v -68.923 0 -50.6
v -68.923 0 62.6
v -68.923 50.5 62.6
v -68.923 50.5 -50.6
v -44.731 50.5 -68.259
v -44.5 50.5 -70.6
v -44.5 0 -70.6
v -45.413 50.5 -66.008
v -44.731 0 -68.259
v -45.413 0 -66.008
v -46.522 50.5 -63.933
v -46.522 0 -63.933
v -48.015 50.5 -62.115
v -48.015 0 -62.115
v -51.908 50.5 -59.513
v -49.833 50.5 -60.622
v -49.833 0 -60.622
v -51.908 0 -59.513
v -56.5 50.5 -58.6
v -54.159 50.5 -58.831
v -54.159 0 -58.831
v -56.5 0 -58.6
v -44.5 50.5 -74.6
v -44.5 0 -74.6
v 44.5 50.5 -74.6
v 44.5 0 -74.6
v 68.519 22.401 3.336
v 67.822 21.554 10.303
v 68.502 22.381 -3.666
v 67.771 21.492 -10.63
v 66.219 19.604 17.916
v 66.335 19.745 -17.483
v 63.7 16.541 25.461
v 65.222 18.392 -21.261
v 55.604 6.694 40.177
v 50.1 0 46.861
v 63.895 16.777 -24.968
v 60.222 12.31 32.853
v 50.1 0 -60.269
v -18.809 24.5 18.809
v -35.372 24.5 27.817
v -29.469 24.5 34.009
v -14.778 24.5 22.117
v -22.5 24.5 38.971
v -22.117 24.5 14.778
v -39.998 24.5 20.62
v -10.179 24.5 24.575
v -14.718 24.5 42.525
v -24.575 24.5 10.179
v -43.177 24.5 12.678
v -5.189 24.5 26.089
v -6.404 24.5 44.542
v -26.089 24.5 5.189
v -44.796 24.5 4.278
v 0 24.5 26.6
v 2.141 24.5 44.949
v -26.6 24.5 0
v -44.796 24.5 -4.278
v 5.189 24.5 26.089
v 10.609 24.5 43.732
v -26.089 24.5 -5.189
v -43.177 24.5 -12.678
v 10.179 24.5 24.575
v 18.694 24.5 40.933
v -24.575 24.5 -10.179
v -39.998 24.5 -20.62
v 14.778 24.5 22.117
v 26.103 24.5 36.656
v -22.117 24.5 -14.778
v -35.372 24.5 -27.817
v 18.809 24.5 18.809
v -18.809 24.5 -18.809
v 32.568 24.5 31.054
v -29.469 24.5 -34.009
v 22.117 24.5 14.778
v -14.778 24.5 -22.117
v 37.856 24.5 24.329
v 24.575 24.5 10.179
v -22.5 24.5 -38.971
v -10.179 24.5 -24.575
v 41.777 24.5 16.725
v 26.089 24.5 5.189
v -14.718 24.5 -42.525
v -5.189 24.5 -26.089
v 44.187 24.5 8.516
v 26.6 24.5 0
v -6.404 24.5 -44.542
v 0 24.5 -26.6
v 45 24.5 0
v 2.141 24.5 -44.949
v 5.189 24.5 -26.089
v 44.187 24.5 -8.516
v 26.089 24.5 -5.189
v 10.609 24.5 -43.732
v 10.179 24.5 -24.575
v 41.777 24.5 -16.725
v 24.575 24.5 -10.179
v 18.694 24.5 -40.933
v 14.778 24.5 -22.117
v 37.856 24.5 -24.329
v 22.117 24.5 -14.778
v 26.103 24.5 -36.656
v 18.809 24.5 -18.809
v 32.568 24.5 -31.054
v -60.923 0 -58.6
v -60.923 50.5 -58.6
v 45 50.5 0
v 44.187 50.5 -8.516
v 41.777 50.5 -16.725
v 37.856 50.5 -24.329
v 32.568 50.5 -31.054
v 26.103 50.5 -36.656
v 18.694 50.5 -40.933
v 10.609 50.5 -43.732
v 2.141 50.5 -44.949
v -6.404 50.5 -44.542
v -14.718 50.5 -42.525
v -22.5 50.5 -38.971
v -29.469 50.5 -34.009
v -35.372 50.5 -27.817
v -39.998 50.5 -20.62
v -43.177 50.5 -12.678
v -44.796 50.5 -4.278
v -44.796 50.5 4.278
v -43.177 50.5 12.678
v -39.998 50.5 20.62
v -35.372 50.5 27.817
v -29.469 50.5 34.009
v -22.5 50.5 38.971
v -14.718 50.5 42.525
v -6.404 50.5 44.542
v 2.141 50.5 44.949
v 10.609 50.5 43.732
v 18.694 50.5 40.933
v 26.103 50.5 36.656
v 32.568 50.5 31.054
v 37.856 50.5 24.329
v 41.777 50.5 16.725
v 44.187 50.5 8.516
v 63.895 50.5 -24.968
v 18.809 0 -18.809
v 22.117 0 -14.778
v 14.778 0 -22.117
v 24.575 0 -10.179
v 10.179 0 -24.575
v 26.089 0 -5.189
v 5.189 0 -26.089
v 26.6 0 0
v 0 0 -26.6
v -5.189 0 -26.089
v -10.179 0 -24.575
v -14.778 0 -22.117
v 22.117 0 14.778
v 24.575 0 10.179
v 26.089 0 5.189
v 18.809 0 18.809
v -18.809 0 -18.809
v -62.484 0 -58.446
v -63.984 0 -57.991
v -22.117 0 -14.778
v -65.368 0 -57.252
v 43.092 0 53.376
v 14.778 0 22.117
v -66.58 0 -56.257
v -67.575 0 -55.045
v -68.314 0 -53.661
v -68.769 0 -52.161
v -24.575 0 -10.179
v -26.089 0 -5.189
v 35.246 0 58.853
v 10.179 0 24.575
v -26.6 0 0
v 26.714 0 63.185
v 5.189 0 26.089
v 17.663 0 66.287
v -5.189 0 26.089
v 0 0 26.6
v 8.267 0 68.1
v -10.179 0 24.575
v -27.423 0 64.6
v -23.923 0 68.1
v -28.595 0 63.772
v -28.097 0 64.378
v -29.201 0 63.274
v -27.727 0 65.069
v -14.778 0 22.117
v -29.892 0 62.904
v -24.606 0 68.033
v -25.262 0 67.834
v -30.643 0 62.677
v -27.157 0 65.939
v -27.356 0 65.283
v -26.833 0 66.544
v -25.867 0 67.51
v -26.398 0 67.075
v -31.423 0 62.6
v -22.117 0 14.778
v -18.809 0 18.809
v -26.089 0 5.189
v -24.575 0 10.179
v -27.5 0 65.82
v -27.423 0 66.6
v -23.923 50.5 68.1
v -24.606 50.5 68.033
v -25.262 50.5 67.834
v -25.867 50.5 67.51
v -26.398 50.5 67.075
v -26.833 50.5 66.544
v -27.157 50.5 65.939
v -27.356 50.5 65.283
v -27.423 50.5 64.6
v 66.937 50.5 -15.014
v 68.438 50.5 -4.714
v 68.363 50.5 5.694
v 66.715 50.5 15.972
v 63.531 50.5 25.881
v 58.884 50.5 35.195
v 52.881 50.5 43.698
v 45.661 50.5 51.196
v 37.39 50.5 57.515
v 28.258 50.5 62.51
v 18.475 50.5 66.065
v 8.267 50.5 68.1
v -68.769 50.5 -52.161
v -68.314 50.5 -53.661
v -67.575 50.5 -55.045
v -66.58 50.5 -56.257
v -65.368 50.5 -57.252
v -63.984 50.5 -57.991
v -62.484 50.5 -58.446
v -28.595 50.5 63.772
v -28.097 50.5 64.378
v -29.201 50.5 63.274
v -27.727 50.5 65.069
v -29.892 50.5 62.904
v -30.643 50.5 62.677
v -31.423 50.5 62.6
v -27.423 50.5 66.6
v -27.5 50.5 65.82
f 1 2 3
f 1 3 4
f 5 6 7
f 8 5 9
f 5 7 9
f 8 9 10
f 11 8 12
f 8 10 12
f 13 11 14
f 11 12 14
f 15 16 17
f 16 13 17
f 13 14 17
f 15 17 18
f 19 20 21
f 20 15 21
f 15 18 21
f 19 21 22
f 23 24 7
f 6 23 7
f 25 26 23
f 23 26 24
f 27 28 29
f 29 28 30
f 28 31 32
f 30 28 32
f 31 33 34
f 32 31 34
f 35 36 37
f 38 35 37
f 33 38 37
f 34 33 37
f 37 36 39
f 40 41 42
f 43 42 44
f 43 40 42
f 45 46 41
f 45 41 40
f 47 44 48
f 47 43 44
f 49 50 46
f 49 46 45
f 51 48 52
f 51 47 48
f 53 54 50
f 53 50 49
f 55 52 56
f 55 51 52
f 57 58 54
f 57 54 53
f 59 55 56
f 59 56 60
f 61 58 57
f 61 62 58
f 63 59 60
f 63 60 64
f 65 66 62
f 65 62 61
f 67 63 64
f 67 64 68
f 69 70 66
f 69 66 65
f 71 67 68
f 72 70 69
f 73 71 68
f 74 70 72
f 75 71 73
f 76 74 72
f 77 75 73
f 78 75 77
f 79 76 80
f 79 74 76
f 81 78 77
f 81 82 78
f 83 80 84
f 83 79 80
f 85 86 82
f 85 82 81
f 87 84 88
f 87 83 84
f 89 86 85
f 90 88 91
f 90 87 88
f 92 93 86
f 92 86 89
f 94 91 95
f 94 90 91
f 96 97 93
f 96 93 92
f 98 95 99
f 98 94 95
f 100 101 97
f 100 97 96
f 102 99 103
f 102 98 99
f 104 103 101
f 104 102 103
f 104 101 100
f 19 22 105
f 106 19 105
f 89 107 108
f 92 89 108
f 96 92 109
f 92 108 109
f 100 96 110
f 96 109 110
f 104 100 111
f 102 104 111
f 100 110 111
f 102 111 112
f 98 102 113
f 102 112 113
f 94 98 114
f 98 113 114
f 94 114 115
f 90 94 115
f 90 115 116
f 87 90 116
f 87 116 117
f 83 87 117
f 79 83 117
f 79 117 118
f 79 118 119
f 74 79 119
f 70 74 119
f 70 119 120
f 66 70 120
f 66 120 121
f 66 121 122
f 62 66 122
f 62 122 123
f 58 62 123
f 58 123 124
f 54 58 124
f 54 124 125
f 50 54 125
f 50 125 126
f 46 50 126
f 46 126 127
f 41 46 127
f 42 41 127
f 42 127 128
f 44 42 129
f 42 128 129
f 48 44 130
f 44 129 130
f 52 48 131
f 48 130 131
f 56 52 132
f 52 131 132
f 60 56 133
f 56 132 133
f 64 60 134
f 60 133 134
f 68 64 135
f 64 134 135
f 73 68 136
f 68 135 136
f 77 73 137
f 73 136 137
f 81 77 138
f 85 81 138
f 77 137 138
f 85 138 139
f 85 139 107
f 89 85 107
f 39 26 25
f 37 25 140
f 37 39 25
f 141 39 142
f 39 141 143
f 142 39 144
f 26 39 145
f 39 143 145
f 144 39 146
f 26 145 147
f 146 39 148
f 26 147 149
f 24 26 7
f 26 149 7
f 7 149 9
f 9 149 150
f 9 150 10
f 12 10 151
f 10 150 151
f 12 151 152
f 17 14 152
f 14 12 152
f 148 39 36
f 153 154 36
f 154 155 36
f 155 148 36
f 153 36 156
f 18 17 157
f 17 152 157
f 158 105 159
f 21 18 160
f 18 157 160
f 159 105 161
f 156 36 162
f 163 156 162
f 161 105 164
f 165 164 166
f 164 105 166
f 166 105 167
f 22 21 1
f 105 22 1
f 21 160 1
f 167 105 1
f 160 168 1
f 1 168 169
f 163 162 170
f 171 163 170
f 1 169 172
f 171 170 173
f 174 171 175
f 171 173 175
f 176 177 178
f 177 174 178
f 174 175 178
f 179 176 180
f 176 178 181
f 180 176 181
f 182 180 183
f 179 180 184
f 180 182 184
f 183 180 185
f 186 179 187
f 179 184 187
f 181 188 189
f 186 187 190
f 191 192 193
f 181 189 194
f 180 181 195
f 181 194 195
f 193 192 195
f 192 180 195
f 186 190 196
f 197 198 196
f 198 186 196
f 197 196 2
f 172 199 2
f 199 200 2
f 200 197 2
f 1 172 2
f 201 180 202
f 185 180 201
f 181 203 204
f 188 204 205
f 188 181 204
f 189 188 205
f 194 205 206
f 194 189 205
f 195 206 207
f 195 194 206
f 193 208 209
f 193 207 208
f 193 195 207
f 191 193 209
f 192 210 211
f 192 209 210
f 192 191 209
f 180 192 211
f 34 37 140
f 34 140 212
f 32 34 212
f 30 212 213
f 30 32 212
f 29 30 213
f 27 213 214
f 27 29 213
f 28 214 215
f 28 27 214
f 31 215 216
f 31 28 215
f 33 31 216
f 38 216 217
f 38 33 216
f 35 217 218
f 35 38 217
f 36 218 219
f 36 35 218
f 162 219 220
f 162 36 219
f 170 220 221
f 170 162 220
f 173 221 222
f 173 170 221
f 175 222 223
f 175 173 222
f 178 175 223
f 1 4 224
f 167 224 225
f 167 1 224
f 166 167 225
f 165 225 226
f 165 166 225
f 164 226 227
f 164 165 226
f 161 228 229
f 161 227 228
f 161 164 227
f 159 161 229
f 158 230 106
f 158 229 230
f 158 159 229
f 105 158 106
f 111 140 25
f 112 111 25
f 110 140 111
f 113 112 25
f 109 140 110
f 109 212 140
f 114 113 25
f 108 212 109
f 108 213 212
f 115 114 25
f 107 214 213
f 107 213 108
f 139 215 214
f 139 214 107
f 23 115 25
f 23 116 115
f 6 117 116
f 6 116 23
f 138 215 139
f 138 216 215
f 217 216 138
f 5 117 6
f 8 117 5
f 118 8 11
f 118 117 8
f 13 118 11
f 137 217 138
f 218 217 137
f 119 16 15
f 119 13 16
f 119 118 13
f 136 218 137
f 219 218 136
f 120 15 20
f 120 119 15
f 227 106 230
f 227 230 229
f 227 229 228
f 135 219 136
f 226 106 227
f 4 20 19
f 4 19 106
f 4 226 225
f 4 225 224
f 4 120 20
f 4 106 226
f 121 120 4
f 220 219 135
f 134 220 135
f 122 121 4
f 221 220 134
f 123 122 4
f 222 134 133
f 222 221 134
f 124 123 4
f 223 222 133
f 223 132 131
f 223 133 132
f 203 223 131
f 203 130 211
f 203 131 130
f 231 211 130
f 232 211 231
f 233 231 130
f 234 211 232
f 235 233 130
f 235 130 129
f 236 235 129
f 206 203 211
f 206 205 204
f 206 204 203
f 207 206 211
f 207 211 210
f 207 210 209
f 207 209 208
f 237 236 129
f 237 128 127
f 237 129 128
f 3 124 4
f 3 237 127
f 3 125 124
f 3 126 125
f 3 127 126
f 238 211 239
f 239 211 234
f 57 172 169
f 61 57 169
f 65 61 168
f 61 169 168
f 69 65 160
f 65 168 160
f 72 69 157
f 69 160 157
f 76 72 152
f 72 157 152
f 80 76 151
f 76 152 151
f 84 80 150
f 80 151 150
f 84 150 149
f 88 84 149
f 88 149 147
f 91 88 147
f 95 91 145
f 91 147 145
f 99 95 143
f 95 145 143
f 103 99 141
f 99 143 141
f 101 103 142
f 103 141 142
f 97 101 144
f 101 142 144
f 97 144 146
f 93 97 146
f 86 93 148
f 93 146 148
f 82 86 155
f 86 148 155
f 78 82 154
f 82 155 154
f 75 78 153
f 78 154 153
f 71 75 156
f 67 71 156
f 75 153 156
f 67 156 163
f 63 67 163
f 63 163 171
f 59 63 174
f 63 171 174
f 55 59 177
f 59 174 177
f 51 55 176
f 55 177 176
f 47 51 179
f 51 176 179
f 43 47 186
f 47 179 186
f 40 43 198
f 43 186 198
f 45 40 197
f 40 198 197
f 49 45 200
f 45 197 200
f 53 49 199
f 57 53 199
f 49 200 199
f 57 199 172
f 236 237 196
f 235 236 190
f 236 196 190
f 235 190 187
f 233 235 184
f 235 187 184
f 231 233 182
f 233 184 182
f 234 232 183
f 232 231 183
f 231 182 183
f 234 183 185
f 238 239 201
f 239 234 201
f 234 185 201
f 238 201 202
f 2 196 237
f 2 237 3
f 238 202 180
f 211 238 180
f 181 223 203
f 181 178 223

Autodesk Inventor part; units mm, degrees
ref_plane "YZ Plane" through (0, 0, 0) normal (1, 0, 0) x (0, 1, 0)
ref_plane "XZ Plane" through (0, 0, 0) normal (0, 1, 0) x (-1, 0, 0)
ref_plane "XY Plane" through (0, 0, 0) normal (0, 0, 1) x (1, 0, 0)
sketch "Sketch1" plane through (0, 0, 0) normal (0, 1, 0) x (-1, 0, 0)
  circle A0 centre (0, 0) radius 26.6
  line L0 (0, -26.6) -> (0, -74.6) construction
  line L1 (-44.5, -74.6) -> (44.5, -74.6)
  line L2 (0, 26.6) -> (0, 68.1) construction
  line L3 (-44.5, -74.6) -> (-63.8947, -24.9684)
  line L4 (26.6, 0) -> (69.1, 0) construction
  arc A1 (-8.2674, 68.1) -> (-63.8947, -24.9684) centre (0, 0) ccw
  line L5 (44.5, -74.6) -> (44.5, -70.6)
  line L6 (56.5, -58.6) -> (60.923, -58.6)
  arc A2 (56.5, -58.6) -> (44.5, -70.6) centre (56.5, -70.6) ccw
  arc A3 (60.923, -58.6) -> (68.923, -50.6) centre (60.923, -50.6) ccw
  line L7 (68.923, 68.1) -> (27.423, 68.1) construction
  line L8 (27.423, 68.1) -> (27.423, 62.6) construction
  line L9 (31.423, 62.6) -> (68.923, 62.6)
  line L10 (-8.2674, 68.1) -> (23.923, 68.1)
  line L11 (27.423, 66.6) -> (27.423, 64.6)
  line L12 (68.923, 62.6) -> (68.923, -50.6)
  arc A4 (27.423, 64.6) -> (23.923, 68.1) centre (23.923, 64.6) ccw
  arc A5 (27.423, 66.6) -> (31.423, 62.6) centre (31.423, 66.6) ccw
  point P0 (44.5, -58.6)
  dimension "d0" = 53.2
  dimension "d2" = 48
  dimension "d3" = 44.5
  dimension "d4" = 89
  dimension "d5" = 41.5
  dimension "d6" = 42.5
  dimension "d7" = 16
  dimension "d8" = 12
  dimension "d9" = 8
  dimension "d10" = 5.5
  dimension "d11" = 41.5
  dimension "d12" = 3.5
  dimension "d13" = 4
extrude "Extrusion1" add sketch "Sketch1" along normal blind 50.5
sketch "Sketch2" plane through (0, 50.5, 0) normal (0, 1, 0) x (1, 0, 0)
  circle A0 centre (0, 0) radius 45
  dimension "d16" = 90
extrude "Extrusion2" cut sketch "Sketch2" against normal blind 26
sketch "Sketch3" plane through (0, 0, 0) normal (0, 0, 1) x (1, 0, 0)
  line L0 (68.6, 22.5) -> (85.1798, 22.5)
  line L1 (68.6, 0) -> (50.1, 0)
  line L2 (68.6, 0) -> (8.2674, 0) projected
  line L3 (50.1, 0) -> (68.6, 22.5)
  line L4 (68.6, 0) -> (85.1798, 22.5)
  point P0 (0, 0)
  point P1 (63.8947, 0)
  dimension "d20" = 18.5
extrude "Extrusion3" cut sketch "Sketch3" along normal mid plane 150
properties part number "PocketNC_Workpiece_Z_axis_rotation"
